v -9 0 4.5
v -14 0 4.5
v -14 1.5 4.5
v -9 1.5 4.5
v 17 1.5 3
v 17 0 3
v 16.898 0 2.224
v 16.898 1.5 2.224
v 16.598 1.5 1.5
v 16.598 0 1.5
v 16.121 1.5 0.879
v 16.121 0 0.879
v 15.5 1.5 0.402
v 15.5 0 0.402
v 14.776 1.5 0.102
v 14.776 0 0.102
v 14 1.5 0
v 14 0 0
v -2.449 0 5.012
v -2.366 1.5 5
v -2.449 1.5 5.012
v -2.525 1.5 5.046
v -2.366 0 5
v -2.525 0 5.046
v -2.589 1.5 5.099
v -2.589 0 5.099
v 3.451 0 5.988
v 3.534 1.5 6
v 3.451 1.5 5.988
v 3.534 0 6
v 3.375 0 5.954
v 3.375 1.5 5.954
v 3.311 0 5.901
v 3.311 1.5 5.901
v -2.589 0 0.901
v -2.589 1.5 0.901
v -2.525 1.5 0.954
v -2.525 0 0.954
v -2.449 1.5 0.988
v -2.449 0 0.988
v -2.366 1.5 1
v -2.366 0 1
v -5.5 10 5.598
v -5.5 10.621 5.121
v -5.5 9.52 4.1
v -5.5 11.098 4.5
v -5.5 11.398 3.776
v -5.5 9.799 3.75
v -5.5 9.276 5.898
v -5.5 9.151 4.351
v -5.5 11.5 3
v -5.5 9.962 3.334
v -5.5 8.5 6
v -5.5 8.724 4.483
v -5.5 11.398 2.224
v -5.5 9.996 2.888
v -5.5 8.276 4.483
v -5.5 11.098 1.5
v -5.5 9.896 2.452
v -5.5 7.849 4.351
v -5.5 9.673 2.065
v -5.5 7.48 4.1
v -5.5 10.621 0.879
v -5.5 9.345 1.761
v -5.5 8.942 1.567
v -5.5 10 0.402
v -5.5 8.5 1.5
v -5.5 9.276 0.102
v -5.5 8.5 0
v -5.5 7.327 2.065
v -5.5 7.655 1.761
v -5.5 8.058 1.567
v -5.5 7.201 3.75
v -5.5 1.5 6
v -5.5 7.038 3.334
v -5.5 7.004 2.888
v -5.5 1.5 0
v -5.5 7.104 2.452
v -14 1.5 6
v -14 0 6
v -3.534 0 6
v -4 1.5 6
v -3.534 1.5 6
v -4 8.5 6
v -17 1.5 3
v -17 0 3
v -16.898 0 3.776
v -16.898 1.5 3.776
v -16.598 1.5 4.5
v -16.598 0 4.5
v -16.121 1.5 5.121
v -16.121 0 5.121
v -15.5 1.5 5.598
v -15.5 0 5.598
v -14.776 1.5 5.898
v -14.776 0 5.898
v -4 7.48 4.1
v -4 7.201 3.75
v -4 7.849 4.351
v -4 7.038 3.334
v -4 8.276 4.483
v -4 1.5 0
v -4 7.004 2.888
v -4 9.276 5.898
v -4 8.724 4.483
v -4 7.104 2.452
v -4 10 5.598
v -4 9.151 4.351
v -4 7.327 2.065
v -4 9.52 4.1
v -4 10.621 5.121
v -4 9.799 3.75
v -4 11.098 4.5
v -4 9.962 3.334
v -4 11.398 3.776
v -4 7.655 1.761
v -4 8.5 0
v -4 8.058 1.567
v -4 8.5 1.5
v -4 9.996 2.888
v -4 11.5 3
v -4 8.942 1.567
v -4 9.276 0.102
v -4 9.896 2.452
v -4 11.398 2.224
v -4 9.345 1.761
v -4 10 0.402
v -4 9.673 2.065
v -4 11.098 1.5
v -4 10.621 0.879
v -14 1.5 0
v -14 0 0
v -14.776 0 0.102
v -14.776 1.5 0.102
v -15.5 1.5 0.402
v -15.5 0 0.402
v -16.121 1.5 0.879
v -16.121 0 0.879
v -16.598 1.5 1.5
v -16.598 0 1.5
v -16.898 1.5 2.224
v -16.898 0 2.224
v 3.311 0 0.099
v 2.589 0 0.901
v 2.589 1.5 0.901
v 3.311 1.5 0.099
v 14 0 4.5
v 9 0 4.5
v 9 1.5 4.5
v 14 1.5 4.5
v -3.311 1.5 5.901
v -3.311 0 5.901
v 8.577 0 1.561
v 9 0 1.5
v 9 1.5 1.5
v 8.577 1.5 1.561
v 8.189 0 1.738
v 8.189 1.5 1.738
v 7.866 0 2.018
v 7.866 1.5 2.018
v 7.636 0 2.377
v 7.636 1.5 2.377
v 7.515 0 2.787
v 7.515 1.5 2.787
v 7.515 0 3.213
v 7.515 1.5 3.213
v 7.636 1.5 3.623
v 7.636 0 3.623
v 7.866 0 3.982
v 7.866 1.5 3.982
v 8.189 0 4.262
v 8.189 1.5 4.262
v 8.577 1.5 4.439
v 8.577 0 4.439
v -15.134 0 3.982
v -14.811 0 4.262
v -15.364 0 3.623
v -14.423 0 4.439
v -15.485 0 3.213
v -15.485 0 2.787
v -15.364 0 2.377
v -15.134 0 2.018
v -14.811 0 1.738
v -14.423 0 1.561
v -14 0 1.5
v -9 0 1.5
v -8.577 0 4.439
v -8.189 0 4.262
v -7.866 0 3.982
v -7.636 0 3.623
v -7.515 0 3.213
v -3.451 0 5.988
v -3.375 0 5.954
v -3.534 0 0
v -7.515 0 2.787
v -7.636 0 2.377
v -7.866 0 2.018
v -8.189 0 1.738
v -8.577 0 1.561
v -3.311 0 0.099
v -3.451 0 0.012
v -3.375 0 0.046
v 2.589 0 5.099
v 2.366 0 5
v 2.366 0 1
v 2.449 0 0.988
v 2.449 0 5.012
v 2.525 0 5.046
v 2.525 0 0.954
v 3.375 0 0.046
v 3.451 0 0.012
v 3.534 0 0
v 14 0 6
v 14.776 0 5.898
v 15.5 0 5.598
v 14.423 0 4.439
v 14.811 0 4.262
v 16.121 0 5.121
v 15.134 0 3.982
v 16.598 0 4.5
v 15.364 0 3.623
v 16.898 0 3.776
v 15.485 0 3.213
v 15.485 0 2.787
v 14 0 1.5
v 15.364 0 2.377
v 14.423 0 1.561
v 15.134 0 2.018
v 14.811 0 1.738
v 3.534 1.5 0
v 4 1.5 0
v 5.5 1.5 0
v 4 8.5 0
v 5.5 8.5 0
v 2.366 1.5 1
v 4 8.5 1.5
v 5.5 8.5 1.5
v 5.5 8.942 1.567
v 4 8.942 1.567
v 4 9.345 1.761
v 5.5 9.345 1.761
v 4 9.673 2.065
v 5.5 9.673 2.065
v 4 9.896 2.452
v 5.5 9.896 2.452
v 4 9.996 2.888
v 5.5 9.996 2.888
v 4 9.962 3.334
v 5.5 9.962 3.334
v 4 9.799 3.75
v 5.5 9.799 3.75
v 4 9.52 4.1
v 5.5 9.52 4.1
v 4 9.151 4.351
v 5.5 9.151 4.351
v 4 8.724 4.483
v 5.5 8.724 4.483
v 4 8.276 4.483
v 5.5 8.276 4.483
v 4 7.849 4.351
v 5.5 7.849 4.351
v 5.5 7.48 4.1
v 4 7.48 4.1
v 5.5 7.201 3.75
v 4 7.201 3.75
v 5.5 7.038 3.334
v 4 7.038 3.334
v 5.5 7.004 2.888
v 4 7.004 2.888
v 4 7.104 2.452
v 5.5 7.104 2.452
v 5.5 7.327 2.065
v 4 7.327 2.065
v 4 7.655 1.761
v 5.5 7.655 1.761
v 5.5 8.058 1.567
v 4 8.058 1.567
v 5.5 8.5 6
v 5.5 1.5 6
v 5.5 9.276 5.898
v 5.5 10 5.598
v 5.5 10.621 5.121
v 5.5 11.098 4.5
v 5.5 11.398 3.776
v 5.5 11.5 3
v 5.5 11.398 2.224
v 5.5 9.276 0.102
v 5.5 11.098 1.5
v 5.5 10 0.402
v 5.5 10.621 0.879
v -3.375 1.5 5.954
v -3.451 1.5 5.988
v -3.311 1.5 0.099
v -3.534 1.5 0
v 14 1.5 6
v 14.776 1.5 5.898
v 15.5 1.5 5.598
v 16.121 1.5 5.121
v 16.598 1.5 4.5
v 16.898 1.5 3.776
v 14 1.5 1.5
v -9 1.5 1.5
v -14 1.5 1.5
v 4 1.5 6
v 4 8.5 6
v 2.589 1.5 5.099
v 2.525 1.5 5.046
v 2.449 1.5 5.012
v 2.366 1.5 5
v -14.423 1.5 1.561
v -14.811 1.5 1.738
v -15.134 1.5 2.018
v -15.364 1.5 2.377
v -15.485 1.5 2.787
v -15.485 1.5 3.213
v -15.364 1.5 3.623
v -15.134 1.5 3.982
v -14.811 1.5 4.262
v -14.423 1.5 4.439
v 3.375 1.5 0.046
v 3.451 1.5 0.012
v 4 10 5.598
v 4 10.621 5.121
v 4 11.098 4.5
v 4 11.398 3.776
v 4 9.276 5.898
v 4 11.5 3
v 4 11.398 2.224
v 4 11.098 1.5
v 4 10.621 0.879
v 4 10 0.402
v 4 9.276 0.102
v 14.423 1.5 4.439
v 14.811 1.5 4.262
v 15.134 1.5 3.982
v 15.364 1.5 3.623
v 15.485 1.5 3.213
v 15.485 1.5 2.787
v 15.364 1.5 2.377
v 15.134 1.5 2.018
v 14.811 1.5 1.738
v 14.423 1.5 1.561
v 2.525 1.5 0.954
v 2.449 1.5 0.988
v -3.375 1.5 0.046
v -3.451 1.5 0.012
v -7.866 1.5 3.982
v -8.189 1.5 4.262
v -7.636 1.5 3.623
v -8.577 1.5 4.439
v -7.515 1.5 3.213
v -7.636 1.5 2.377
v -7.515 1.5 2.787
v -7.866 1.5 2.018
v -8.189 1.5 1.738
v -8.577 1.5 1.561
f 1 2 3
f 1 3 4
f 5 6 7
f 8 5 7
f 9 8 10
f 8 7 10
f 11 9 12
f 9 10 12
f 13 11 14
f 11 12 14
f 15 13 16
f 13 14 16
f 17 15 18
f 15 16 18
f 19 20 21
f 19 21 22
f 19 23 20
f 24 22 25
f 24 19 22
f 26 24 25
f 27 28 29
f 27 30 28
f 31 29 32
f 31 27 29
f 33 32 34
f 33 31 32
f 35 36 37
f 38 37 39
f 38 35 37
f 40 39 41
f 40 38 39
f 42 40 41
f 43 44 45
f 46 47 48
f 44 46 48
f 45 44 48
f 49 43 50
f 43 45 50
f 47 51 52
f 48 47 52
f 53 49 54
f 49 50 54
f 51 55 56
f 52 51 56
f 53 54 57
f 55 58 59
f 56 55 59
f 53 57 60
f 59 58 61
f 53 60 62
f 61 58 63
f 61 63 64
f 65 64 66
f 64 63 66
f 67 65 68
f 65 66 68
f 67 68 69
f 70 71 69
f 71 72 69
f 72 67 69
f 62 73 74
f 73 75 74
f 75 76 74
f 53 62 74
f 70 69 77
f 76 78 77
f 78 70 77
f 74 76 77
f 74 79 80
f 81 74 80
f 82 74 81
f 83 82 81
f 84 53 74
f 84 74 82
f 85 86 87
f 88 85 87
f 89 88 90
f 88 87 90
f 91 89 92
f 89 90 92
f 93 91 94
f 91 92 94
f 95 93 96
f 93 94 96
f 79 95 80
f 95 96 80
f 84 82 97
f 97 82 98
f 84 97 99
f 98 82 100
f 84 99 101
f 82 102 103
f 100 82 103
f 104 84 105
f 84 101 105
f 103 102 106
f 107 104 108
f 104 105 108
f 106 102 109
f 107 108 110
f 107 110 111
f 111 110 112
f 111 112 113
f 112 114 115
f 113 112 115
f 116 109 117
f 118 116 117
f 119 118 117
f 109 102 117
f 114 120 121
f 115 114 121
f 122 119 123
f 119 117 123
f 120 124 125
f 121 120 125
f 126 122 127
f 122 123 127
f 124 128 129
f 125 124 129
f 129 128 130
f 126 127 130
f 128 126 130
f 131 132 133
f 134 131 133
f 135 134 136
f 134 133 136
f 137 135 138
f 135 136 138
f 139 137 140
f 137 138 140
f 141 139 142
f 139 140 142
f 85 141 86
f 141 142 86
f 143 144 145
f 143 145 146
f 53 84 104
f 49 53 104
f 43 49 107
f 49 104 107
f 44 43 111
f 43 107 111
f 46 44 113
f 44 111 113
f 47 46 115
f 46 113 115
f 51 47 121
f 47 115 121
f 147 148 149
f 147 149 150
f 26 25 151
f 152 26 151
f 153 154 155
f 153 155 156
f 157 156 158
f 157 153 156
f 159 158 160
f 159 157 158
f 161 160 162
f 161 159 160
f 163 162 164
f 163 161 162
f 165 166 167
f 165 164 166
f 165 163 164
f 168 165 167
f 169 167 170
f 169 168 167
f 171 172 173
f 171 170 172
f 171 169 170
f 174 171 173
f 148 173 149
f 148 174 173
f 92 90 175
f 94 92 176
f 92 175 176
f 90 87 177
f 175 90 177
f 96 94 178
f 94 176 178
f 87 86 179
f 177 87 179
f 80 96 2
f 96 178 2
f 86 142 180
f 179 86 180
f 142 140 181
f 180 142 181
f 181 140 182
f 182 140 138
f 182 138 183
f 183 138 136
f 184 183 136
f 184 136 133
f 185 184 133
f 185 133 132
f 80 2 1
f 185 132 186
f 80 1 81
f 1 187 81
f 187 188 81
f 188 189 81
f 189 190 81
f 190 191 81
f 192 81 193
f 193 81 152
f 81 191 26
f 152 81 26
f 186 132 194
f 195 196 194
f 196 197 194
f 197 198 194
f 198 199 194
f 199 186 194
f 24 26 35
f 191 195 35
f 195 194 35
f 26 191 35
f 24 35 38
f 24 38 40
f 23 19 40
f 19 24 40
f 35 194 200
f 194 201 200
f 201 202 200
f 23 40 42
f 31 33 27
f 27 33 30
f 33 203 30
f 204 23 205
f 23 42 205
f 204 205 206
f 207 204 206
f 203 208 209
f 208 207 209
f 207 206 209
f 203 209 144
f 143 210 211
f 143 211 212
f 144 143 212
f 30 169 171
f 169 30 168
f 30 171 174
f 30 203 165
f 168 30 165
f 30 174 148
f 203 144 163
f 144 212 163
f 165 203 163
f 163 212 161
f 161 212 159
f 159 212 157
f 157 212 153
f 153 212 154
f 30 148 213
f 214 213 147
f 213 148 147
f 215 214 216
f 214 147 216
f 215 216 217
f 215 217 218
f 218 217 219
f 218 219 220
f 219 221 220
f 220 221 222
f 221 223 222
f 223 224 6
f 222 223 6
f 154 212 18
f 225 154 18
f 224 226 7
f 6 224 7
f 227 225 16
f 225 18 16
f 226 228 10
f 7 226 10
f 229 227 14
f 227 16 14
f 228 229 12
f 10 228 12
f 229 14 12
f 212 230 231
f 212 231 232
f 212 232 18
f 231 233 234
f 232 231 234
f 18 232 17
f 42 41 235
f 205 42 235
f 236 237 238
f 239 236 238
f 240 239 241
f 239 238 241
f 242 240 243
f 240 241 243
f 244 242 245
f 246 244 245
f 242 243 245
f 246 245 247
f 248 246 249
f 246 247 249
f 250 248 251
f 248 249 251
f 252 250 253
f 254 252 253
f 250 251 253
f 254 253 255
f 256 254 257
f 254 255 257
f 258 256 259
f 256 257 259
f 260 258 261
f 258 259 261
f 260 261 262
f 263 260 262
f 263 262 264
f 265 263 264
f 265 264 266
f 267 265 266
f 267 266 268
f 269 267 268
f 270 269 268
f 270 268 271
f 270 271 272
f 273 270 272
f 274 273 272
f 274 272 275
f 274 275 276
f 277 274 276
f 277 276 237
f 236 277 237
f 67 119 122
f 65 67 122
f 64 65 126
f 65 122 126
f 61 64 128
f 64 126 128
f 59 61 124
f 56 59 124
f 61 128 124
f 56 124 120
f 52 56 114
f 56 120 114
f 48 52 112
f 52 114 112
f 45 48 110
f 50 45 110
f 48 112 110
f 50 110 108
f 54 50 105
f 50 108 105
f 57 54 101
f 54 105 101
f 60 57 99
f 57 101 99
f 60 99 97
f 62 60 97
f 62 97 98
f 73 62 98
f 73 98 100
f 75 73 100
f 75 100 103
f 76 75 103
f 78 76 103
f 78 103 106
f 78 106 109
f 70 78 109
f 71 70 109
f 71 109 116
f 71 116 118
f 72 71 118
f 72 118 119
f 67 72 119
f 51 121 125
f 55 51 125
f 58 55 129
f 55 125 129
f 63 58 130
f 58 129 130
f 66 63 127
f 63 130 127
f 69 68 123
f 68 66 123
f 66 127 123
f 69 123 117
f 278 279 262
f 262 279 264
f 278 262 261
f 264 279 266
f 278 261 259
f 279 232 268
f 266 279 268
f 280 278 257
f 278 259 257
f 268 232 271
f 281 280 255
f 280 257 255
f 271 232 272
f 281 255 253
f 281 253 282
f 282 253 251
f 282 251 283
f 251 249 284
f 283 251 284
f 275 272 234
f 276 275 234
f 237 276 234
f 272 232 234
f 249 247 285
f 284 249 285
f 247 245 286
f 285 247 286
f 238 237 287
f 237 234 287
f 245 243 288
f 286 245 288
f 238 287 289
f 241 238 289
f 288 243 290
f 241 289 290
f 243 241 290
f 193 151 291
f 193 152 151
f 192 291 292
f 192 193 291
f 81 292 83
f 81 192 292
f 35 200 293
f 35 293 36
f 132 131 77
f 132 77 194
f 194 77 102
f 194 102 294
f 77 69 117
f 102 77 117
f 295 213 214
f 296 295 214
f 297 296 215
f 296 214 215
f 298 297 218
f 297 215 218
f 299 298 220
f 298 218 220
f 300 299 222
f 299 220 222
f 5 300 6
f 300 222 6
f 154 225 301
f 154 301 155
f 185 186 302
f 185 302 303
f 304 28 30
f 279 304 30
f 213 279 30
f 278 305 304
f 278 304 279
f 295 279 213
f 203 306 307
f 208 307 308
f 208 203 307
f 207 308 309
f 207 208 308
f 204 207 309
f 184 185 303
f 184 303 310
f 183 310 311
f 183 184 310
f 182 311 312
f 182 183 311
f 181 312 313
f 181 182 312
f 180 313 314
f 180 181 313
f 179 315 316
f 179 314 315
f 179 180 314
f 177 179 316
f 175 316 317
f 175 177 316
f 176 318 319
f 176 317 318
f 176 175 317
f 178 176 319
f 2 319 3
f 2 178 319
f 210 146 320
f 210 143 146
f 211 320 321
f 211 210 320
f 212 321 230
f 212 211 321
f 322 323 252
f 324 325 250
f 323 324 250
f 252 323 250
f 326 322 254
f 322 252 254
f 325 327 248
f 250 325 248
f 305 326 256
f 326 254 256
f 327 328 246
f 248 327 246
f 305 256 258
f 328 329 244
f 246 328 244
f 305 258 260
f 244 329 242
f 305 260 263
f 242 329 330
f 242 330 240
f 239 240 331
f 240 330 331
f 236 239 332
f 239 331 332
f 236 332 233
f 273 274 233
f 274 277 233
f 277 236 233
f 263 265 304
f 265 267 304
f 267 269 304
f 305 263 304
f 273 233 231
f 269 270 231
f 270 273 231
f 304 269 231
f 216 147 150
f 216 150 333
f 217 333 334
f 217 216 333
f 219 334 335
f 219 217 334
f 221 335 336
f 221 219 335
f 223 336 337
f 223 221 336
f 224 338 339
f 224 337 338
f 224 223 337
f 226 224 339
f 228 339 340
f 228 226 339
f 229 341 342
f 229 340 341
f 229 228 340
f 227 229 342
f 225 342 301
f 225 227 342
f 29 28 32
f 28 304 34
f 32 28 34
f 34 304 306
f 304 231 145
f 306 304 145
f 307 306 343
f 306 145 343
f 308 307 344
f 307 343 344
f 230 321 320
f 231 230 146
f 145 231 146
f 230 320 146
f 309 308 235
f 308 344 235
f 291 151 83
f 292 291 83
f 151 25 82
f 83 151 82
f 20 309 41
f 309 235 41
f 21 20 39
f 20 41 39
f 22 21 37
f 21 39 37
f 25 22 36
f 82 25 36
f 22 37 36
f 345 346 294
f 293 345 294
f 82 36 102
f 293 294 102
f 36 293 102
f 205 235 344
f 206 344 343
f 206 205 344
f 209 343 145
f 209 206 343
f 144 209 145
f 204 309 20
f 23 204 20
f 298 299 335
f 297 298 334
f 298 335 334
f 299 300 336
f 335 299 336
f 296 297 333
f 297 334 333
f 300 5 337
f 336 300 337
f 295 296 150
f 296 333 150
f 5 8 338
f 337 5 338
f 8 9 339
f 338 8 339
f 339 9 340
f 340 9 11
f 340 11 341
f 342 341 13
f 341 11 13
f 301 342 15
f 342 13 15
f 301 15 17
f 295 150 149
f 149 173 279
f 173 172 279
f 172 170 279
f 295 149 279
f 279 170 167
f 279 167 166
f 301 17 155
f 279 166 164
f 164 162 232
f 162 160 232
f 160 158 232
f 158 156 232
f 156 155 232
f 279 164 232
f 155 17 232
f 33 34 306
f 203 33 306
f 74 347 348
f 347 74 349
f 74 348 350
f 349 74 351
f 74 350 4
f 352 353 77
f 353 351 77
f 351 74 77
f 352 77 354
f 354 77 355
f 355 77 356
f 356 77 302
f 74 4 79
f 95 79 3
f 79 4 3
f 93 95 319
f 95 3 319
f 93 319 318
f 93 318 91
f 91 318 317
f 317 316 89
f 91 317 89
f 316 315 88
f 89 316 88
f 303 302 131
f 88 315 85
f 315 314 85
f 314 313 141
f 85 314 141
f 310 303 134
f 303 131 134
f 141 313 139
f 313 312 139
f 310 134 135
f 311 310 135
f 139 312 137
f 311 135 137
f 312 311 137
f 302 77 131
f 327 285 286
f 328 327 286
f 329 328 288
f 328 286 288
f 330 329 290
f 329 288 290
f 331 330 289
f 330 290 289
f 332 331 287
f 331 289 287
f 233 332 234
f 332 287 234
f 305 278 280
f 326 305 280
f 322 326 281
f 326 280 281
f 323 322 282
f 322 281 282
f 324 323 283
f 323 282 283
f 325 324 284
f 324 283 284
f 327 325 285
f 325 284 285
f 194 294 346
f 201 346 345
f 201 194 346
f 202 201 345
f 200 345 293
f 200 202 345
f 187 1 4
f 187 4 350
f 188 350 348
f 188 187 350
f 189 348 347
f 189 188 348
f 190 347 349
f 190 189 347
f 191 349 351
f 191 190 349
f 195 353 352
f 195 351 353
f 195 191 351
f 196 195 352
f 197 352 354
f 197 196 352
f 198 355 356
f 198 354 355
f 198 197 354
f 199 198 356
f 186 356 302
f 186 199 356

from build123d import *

# Parameters (mm, degrees)
EXTRUDE_1_DEPTH     = 6
CUT_EXTRUDE_1_DEPTH = 12.5
CUT_EXTRUDE_2_DEPTH = 12.5
SKETCH_4_R          = 1.5
CUT_EXTRUDE_3_DEPTH = 23.5
CUT_EXTRUDE_4_DEPTH = 2.5
FILLET_1_R          = 0.3


with BuildPart() as part:
    # 草图1 → 凸台-拉伸1 (new body)
    with BuildSketch(Plane.XY):
        Polygon((-17, 0), (17, 0), (17, 1.5), (5.5, 1.5), (5.5, 11.5), (4, 11.5), (4, 1.5), (-4, 1.5), (-4, 11.5), (-5.5, 11.5), (-5.5, 1.5), (-17, 1.5), align=None)
    extrude(amount=EXTRUDE_1_DEPTH)

    # 草图2 → 切除-拉伸1 (cut, through all)
    with BuildSketch(Plane.XZ):
        with BuildLine():
            Line((-14, 6), (-17, 6))
            Line((-17, 6), (-17, 3))
            ThreePointArc((-17, 3), (-16.121320344, 5.121320344), (-14, 6))
        make_face()
        with BuildLine():
            ThreePointArc((-14, 0), (-16.121320344, 0.878679656), (-17, 3))
            Line((-17, 3), (-17, 0))
            Line((-17, 0), (-14, 0))
        make_face()
        with BuildLine():
            Line((17, 0), (17, 3))
            ThreePointArc((17, 3), (16.121320344, 0.878679656), (14, 0))
            Line((14, 0), (17, 0))
        make_face()
        with BuildLine():
            Line((17, 6), (14, 6))
            ThreePointArc((14, 6), (16.121320344, 5.121320344), (17, 3))
            Line((17, 3), (17, 6))
        make_face()
    extrude(amount=-CUT_EXTRUDE_1_DEPTH, mode=Mode.SUBTRACT)

    # 草图3 → 切除-拉伸2 (cut, through all)
    with BuildSketch(Plane.XZ):
        with BuildLine():
            Line((-9, 1.5), (-14, 1.5))
            ThreePointArc((-14, 1.5), (-15.5, 3), (-14, 4.5))
            Line((-14, 4.5), (-9, 4.5))
            ThreePointArc((-9, 4.5), (-7.5, 3), (-9, 1.5))
        make_face()
        with BuildLine():
            Line((9, 4.5), (14, 4.5))
            ThreePointArc((14, 4.5), (15.5, 3), (14, 1.5))
            Line((14, 1.5), (9, 1.5))
            ThreePointArc((9, 1.5), (7.5, 3), (9, 4.5))
        make_face()
    extrude(amount=-CUT_EXTRUDE_2_DEPTH, mode=Mode.SUBTRACT)

    # 草图4 → 切除-拉伸3 (cut, through all)
    with BuildSketch(Plane(origin=(5.5, 0, 0), x_dir=(0, 0, -1), z_dir=(1, 0, 0))):
        with BuildLine():
            Line((-3, 11.5), (-6, 11.5))
            Line((-6, 11.5), (-6, 8.5))
            ThreePointArc((-6, 8.5), (-5.121320344, 10.621320344), (-3, 11.5))
        make_face()
        with BuildLine():
            Line((0, 11.5), (-3, 11.5))
            ThreePointArc((-3, 11.5), (-0.878679656, 10.621320344), (0, 8.5))
            Line((0, 8.5), (0, 11.5))
        make_face()
        with Locations((-3, 8.5)):
            Circle(SKETCH_4_R)
    extrude(amount=-CUT_EXTRUDE_3_DEPTH, mode=Mode.SUBTRACT)

    # 草图5 → 切除-拉伸4 (cut, through all)
    with BuildSketch(Plane(origin=(0, 1.5, 0), x_dir=(1, 0, 0), z_dir=(0, 1, 0))):
        Polygon((2.5, -1), (3.4, 0), (-3.4, 0), (-2.5, -1), align=None)
        Polygon((-3.4, -6), (3.4, -6), (2.5, -5), (-2.5, -5), align=None)
    extrude(amount=-CUT_EXTRUDE_4_DEPTH, mode=Mode.SUBTRACT)

    # 圆角1
    fillet_1_edges = [part.edges().sort_by_distance(p)[0] for p in [
        (-2.5, 0.75, 1),
        (-3.4, 0.75, 0),
        (3.4, 0.75, 0),
        (2.5, 0.75, 1),
        (-2.5, 0.75, 5),
        (2.5, 0.75, 5),
        (3.4, 0.75, 6),
        (-3.4, 0.75, 6),
    ]]
    fillet(fillet_1_edges, radius=FILLET_1_R)


solid = part.part
